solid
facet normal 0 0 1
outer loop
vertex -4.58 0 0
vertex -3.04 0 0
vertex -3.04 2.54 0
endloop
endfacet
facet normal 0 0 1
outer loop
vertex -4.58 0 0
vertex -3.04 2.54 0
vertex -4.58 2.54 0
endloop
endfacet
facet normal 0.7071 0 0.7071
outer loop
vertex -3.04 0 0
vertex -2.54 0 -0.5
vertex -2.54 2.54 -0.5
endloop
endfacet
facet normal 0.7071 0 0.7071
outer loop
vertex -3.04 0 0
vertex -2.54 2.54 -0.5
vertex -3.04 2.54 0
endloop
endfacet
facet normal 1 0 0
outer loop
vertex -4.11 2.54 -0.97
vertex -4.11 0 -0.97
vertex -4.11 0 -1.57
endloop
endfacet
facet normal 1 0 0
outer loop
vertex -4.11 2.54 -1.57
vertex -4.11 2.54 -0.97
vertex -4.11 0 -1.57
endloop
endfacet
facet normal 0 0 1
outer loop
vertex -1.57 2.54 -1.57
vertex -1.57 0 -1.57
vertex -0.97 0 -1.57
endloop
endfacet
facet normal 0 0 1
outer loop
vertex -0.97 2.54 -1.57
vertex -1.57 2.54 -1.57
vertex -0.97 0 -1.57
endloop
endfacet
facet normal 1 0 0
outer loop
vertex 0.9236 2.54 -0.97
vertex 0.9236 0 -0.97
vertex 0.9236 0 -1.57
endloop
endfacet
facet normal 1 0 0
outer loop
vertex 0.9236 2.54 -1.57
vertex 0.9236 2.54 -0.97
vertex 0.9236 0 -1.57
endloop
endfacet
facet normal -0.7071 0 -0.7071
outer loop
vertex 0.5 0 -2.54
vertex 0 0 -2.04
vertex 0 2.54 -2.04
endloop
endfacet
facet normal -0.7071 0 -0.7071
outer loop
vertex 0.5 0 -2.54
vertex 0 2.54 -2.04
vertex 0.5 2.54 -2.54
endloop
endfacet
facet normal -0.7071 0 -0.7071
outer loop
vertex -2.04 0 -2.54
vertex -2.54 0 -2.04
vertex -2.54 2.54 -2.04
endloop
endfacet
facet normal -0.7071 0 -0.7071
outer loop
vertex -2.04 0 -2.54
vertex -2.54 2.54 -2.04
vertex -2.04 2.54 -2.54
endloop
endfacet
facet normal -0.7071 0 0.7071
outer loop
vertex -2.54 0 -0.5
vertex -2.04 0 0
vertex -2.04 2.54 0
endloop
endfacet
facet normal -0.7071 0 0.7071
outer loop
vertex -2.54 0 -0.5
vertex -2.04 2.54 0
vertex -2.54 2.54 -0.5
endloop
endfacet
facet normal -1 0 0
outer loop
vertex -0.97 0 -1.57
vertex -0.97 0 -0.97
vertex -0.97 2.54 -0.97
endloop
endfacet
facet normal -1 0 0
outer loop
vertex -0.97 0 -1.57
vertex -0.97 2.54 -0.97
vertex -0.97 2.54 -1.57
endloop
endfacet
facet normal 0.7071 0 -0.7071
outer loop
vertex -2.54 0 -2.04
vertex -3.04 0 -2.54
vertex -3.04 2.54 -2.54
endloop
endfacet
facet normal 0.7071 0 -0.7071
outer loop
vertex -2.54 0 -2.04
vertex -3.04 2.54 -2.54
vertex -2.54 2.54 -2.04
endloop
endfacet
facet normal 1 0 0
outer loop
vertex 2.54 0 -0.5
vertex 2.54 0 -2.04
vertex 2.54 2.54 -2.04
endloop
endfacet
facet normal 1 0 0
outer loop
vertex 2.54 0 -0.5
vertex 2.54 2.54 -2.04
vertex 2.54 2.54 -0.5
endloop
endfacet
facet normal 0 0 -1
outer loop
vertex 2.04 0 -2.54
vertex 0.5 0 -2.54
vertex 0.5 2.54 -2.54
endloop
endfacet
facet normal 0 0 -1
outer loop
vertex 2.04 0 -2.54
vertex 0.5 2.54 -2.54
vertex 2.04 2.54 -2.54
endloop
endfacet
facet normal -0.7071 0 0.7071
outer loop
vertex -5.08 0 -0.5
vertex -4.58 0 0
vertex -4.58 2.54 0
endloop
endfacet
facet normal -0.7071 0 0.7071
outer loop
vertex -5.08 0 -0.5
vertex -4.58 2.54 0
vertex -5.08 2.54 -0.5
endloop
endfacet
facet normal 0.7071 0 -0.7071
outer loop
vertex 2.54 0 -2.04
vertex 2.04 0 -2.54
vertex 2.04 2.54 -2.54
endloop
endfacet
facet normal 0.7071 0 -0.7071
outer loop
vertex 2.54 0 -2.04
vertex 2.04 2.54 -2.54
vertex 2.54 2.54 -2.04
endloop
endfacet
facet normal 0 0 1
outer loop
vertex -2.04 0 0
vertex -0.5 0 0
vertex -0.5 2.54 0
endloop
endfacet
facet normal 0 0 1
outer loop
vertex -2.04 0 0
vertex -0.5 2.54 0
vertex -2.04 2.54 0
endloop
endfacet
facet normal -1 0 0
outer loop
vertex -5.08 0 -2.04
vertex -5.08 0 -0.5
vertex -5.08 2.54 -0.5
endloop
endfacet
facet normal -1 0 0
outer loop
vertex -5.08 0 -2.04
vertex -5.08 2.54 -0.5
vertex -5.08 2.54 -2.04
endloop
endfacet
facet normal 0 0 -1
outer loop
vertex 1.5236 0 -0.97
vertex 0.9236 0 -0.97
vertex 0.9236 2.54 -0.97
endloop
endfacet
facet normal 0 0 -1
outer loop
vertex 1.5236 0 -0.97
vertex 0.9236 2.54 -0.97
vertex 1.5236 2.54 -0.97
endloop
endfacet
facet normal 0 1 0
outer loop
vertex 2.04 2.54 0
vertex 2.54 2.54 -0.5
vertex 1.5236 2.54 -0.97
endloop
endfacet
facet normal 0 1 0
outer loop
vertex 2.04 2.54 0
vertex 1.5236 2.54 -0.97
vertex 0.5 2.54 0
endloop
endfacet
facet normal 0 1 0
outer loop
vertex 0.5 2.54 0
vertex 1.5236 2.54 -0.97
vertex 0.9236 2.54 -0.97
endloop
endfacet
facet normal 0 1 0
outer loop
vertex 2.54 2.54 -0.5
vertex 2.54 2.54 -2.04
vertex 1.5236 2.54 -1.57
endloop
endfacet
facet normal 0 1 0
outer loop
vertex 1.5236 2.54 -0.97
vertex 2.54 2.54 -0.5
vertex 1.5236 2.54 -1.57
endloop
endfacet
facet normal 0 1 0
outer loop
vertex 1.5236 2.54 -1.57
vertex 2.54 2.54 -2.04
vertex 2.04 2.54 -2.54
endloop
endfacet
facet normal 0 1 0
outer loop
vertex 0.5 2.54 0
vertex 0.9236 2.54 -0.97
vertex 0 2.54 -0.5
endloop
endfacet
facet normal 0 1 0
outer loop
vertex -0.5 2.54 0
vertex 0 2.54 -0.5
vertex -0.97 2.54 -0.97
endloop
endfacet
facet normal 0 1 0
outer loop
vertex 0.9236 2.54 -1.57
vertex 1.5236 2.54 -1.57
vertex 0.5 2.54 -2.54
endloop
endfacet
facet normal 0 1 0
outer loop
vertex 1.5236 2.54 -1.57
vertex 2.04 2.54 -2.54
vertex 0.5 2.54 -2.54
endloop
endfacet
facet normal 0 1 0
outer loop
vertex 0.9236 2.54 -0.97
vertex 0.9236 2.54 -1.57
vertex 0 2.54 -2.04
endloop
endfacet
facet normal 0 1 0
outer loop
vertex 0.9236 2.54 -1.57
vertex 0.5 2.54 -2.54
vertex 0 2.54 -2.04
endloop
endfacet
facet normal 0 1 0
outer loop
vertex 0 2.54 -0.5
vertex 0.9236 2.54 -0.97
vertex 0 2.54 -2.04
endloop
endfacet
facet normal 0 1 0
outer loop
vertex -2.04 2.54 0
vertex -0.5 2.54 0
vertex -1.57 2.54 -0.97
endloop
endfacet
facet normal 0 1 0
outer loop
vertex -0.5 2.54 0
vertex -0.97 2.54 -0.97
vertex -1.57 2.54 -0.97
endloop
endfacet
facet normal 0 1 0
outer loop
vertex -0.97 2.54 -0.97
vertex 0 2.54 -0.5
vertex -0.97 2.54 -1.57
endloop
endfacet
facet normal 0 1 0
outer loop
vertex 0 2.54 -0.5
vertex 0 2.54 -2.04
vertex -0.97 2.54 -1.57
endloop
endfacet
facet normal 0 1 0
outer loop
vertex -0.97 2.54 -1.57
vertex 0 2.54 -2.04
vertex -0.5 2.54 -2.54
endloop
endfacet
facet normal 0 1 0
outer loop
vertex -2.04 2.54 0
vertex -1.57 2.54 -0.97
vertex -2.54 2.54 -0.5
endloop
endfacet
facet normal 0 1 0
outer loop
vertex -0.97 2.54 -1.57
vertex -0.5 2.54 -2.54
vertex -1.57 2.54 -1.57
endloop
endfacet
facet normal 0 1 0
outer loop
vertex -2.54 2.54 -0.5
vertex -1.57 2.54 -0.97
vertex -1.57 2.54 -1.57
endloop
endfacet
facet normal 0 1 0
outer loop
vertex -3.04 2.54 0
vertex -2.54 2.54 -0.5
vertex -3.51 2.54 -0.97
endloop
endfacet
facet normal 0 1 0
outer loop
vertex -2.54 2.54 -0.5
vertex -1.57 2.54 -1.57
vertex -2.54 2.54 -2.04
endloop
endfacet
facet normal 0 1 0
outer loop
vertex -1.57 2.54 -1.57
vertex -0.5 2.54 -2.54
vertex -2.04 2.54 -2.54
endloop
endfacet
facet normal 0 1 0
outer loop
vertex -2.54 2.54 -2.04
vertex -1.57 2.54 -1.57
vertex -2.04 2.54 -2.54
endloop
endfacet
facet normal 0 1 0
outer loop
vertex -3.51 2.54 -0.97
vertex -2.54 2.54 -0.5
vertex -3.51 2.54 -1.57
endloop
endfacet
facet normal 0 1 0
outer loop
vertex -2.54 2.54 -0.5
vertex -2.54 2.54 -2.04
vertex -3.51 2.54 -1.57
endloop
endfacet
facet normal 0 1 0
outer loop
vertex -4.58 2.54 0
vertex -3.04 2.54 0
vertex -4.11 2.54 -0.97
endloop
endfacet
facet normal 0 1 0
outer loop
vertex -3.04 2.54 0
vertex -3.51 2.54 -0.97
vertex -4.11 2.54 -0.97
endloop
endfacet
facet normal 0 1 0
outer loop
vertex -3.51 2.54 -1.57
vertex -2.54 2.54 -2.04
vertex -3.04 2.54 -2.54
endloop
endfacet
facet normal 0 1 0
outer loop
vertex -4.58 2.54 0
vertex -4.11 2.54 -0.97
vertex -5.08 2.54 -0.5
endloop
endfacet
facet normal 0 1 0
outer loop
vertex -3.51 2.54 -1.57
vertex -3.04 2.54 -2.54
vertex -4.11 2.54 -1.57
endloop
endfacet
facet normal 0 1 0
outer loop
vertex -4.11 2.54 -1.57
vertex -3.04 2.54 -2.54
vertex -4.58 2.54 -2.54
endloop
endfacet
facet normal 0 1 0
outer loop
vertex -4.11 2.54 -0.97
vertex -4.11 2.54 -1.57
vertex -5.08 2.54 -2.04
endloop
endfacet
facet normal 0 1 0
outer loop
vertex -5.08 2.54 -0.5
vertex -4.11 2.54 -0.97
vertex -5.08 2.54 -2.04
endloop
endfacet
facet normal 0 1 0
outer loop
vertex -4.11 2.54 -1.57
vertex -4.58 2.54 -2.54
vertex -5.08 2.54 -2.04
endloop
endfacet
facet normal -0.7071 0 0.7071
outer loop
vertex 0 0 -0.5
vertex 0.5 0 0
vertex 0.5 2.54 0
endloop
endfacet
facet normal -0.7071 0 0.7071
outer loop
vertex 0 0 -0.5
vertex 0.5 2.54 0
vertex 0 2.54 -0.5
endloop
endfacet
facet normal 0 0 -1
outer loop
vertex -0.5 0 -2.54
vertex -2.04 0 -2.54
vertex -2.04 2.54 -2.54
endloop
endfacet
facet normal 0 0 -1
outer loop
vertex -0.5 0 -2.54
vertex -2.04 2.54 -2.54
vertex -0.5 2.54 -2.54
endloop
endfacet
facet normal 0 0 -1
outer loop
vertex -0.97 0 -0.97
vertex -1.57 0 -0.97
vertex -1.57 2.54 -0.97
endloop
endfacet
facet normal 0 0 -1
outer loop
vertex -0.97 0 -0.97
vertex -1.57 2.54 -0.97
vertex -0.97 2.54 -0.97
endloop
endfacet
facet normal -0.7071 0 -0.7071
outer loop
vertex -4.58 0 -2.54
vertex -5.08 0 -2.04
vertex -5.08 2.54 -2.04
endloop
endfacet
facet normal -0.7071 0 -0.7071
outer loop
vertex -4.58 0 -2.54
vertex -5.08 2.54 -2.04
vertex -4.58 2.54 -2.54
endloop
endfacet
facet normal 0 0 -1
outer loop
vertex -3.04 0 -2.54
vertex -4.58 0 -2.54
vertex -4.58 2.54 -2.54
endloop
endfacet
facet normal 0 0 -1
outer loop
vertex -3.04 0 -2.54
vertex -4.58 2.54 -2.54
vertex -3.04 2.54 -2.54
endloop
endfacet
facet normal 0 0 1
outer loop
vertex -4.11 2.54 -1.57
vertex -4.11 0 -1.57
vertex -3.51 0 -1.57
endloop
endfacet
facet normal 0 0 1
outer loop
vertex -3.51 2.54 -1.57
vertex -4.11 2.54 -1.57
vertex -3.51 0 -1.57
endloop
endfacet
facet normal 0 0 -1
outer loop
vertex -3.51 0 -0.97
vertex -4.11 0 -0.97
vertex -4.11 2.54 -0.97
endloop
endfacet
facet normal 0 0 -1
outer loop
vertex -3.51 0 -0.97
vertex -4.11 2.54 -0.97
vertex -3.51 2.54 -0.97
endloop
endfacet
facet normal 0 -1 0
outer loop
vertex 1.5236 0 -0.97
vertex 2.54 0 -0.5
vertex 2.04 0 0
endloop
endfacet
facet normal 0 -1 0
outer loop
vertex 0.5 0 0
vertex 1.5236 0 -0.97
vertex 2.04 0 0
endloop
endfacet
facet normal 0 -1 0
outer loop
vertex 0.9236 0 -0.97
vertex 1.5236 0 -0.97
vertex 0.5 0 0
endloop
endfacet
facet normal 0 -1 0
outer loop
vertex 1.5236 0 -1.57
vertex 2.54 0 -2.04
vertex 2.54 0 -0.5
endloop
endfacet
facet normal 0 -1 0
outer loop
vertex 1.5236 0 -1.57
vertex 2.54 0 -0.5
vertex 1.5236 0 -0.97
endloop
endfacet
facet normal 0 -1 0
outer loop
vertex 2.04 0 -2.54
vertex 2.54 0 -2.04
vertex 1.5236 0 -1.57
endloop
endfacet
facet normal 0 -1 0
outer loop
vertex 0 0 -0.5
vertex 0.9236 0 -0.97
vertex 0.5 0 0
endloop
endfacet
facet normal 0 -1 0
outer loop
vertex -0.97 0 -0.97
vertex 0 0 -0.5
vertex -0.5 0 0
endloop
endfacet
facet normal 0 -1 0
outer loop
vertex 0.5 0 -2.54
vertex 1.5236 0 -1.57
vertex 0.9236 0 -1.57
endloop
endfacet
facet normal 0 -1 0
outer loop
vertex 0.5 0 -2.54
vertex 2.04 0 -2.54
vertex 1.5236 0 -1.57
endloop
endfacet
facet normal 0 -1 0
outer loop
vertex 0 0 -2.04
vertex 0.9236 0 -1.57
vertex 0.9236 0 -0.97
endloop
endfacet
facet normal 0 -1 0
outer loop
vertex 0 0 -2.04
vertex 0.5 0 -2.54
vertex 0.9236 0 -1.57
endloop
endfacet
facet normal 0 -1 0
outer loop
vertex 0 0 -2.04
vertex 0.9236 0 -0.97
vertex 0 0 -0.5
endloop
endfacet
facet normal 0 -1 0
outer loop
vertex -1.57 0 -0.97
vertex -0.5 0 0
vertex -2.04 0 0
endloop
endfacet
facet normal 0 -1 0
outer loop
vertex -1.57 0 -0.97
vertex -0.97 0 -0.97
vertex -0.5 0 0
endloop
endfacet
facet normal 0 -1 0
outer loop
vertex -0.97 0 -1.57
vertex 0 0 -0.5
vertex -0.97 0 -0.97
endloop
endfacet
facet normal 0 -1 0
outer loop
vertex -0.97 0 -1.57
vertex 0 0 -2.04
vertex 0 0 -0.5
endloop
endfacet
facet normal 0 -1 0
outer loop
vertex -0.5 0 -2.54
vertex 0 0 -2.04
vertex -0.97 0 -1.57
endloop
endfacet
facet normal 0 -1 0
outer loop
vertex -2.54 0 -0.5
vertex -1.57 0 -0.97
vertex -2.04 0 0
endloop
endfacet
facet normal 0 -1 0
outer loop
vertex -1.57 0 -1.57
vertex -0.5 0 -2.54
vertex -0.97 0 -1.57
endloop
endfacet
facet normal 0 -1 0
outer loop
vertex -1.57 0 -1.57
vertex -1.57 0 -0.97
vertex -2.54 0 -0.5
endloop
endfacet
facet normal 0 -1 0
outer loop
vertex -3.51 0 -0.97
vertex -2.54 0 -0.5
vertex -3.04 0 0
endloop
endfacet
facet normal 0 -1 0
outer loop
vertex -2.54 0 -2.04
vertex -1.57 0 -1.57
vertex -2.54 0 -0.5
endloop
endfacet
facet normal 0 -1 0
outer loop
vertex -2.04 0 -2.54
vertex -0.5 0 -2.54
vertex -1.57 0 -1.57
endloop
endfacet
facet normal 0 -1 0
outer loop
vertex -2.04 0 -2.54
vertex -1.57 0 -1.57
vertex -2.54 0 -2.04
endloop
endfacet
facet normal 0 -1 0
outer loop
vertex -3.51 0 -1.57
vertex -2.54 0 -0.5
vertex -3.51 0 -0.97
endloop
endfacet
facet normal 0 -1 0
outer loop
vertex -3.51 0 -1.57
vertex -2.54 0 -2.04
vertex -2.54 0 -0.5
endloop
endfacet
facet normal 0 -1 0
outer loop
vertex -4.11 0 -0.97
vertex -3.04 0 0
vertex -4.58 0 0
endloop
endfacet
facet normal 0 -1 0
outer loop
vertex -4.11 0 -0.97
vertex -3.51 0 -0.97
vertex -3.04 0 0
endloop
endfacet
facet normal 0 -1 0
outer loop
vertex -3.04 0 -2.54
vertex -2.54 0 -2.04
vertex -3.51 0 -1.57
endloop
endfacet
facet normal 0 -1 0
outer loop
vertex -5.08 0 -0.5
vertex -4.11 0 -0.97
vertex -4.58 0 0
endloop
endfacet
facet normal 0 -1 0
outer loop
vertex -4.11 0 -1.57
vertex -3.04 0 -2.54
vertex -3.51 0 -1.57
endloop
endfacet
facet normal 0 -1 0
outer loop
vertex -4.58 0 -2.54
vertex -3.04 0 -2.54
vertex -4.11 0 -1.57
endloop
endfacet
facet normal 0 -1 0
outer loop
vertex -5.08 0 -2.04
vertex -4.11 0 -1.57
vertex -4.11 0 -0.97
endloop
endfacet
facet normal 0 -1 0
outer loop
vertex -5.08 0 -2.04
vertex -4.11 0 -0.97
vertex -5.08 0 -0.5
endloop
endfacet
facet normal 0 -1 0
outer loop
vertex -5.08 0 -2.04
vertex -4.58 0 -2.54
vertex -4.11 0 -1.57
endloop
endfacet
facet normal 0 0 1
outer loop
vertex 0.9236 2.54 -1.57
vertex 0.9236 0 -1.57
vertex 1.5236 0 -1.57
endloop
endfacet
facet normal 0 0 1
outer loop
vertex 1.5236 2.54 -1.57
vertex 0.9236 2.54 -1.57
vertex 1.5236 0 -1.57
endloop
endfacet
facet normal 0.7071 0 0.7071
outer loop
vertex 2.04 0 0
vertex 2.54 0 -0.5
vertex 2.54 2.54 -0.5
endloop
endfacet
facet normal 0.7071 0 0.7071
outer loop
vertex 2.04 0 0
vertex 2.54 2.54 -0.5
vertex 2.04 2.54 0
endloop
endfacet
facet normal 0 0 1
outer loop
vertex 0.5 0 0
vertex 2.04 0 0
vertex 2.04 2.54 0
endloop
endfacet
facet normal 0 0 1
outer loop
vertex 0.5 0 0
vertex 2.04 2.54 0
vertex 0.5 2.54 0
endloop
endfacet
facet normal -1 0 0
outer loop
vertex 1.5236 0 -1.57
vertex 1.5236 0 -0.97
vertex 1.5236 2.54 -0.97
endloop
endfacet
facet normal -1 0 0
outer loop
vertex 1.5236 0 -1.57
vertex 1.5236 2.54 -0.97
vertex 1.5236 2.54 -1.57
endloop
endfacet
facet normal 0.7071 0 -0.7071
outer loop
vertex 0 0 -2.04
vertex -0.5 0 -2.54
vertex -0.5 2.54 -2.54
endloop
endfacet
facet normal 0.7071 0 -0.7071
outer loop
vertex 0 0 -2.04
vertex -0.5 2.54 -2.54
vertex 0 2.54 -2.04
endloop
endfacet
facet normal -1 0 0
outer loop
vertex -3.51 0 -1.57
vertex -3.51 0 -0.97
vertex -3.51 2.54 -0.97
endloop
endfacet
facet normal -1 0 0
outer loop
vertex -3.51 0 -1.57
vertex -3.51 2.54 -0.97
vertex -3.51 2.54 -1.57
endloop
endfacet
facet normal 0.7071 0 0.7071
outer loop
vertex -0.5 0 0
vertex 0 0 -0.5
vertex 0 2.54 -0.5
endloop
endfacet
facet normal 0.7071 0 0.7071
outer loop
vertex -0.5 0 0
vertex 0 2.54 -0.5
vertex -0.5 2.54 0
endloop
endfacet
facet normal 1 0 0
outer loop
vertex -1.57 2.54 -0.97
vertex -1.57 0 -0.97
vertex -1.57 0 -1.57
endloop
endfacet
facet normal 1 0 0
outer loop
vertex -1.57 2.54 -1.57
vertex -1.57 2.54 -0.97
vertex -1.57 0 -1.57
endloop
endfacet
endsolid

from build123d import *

# Parameters (mm, degrees)
SKETCH1_W           = 0.6
SKETCH1_H           = 0.6
BOSS_EXTRUDE1_DEPTH = 2.54


with BuildPart() as part:
    # Sketch1 → Boss-Extrude1 (new body)
    with BuildSketch(Plane(origin=(0, 0, 0), x_dir=(1, 0, 0), z_dir=(0, 1, 0))):
        Polygon((-0.5, 0), (-2.04, 0), (-2.54, 0.5), (-3.04, 0), (-4.58, 0), (-5.08, 0.5), (-5.08, 2.04), (-4.58, 2.54), (-3.04, 2.54), (-2.54, 2.04), (-2.04, 2.54), (-0.5, 2.54), (0, 2.04), (0.5, 2.54), (2.04, 2.54), (2.54, 2.04), (2.54, 0.5), (2.04, 0), (0.5, 0), (0, 0.5), align=None)
        with Locations((-3.81, 1.27)):
            Rectangle(SKETCH1_W, SKETCH1_H, mode=Mode.SUBTRACT)
        with Locations((-1.27, 1.27)):
            Rectangle(SKETCH1_W, SKETCH1_H, mode=Mode.SUBTRACT)
        with Locations((1.223573691, 1.27)):
            Rectangle(SKETCH1_W, SKETCH1_H, mode=Mode.SUBTRACT)
    extrude(amount=BOSS_EXTRUDE1_DEPTH)


solid = part.part
